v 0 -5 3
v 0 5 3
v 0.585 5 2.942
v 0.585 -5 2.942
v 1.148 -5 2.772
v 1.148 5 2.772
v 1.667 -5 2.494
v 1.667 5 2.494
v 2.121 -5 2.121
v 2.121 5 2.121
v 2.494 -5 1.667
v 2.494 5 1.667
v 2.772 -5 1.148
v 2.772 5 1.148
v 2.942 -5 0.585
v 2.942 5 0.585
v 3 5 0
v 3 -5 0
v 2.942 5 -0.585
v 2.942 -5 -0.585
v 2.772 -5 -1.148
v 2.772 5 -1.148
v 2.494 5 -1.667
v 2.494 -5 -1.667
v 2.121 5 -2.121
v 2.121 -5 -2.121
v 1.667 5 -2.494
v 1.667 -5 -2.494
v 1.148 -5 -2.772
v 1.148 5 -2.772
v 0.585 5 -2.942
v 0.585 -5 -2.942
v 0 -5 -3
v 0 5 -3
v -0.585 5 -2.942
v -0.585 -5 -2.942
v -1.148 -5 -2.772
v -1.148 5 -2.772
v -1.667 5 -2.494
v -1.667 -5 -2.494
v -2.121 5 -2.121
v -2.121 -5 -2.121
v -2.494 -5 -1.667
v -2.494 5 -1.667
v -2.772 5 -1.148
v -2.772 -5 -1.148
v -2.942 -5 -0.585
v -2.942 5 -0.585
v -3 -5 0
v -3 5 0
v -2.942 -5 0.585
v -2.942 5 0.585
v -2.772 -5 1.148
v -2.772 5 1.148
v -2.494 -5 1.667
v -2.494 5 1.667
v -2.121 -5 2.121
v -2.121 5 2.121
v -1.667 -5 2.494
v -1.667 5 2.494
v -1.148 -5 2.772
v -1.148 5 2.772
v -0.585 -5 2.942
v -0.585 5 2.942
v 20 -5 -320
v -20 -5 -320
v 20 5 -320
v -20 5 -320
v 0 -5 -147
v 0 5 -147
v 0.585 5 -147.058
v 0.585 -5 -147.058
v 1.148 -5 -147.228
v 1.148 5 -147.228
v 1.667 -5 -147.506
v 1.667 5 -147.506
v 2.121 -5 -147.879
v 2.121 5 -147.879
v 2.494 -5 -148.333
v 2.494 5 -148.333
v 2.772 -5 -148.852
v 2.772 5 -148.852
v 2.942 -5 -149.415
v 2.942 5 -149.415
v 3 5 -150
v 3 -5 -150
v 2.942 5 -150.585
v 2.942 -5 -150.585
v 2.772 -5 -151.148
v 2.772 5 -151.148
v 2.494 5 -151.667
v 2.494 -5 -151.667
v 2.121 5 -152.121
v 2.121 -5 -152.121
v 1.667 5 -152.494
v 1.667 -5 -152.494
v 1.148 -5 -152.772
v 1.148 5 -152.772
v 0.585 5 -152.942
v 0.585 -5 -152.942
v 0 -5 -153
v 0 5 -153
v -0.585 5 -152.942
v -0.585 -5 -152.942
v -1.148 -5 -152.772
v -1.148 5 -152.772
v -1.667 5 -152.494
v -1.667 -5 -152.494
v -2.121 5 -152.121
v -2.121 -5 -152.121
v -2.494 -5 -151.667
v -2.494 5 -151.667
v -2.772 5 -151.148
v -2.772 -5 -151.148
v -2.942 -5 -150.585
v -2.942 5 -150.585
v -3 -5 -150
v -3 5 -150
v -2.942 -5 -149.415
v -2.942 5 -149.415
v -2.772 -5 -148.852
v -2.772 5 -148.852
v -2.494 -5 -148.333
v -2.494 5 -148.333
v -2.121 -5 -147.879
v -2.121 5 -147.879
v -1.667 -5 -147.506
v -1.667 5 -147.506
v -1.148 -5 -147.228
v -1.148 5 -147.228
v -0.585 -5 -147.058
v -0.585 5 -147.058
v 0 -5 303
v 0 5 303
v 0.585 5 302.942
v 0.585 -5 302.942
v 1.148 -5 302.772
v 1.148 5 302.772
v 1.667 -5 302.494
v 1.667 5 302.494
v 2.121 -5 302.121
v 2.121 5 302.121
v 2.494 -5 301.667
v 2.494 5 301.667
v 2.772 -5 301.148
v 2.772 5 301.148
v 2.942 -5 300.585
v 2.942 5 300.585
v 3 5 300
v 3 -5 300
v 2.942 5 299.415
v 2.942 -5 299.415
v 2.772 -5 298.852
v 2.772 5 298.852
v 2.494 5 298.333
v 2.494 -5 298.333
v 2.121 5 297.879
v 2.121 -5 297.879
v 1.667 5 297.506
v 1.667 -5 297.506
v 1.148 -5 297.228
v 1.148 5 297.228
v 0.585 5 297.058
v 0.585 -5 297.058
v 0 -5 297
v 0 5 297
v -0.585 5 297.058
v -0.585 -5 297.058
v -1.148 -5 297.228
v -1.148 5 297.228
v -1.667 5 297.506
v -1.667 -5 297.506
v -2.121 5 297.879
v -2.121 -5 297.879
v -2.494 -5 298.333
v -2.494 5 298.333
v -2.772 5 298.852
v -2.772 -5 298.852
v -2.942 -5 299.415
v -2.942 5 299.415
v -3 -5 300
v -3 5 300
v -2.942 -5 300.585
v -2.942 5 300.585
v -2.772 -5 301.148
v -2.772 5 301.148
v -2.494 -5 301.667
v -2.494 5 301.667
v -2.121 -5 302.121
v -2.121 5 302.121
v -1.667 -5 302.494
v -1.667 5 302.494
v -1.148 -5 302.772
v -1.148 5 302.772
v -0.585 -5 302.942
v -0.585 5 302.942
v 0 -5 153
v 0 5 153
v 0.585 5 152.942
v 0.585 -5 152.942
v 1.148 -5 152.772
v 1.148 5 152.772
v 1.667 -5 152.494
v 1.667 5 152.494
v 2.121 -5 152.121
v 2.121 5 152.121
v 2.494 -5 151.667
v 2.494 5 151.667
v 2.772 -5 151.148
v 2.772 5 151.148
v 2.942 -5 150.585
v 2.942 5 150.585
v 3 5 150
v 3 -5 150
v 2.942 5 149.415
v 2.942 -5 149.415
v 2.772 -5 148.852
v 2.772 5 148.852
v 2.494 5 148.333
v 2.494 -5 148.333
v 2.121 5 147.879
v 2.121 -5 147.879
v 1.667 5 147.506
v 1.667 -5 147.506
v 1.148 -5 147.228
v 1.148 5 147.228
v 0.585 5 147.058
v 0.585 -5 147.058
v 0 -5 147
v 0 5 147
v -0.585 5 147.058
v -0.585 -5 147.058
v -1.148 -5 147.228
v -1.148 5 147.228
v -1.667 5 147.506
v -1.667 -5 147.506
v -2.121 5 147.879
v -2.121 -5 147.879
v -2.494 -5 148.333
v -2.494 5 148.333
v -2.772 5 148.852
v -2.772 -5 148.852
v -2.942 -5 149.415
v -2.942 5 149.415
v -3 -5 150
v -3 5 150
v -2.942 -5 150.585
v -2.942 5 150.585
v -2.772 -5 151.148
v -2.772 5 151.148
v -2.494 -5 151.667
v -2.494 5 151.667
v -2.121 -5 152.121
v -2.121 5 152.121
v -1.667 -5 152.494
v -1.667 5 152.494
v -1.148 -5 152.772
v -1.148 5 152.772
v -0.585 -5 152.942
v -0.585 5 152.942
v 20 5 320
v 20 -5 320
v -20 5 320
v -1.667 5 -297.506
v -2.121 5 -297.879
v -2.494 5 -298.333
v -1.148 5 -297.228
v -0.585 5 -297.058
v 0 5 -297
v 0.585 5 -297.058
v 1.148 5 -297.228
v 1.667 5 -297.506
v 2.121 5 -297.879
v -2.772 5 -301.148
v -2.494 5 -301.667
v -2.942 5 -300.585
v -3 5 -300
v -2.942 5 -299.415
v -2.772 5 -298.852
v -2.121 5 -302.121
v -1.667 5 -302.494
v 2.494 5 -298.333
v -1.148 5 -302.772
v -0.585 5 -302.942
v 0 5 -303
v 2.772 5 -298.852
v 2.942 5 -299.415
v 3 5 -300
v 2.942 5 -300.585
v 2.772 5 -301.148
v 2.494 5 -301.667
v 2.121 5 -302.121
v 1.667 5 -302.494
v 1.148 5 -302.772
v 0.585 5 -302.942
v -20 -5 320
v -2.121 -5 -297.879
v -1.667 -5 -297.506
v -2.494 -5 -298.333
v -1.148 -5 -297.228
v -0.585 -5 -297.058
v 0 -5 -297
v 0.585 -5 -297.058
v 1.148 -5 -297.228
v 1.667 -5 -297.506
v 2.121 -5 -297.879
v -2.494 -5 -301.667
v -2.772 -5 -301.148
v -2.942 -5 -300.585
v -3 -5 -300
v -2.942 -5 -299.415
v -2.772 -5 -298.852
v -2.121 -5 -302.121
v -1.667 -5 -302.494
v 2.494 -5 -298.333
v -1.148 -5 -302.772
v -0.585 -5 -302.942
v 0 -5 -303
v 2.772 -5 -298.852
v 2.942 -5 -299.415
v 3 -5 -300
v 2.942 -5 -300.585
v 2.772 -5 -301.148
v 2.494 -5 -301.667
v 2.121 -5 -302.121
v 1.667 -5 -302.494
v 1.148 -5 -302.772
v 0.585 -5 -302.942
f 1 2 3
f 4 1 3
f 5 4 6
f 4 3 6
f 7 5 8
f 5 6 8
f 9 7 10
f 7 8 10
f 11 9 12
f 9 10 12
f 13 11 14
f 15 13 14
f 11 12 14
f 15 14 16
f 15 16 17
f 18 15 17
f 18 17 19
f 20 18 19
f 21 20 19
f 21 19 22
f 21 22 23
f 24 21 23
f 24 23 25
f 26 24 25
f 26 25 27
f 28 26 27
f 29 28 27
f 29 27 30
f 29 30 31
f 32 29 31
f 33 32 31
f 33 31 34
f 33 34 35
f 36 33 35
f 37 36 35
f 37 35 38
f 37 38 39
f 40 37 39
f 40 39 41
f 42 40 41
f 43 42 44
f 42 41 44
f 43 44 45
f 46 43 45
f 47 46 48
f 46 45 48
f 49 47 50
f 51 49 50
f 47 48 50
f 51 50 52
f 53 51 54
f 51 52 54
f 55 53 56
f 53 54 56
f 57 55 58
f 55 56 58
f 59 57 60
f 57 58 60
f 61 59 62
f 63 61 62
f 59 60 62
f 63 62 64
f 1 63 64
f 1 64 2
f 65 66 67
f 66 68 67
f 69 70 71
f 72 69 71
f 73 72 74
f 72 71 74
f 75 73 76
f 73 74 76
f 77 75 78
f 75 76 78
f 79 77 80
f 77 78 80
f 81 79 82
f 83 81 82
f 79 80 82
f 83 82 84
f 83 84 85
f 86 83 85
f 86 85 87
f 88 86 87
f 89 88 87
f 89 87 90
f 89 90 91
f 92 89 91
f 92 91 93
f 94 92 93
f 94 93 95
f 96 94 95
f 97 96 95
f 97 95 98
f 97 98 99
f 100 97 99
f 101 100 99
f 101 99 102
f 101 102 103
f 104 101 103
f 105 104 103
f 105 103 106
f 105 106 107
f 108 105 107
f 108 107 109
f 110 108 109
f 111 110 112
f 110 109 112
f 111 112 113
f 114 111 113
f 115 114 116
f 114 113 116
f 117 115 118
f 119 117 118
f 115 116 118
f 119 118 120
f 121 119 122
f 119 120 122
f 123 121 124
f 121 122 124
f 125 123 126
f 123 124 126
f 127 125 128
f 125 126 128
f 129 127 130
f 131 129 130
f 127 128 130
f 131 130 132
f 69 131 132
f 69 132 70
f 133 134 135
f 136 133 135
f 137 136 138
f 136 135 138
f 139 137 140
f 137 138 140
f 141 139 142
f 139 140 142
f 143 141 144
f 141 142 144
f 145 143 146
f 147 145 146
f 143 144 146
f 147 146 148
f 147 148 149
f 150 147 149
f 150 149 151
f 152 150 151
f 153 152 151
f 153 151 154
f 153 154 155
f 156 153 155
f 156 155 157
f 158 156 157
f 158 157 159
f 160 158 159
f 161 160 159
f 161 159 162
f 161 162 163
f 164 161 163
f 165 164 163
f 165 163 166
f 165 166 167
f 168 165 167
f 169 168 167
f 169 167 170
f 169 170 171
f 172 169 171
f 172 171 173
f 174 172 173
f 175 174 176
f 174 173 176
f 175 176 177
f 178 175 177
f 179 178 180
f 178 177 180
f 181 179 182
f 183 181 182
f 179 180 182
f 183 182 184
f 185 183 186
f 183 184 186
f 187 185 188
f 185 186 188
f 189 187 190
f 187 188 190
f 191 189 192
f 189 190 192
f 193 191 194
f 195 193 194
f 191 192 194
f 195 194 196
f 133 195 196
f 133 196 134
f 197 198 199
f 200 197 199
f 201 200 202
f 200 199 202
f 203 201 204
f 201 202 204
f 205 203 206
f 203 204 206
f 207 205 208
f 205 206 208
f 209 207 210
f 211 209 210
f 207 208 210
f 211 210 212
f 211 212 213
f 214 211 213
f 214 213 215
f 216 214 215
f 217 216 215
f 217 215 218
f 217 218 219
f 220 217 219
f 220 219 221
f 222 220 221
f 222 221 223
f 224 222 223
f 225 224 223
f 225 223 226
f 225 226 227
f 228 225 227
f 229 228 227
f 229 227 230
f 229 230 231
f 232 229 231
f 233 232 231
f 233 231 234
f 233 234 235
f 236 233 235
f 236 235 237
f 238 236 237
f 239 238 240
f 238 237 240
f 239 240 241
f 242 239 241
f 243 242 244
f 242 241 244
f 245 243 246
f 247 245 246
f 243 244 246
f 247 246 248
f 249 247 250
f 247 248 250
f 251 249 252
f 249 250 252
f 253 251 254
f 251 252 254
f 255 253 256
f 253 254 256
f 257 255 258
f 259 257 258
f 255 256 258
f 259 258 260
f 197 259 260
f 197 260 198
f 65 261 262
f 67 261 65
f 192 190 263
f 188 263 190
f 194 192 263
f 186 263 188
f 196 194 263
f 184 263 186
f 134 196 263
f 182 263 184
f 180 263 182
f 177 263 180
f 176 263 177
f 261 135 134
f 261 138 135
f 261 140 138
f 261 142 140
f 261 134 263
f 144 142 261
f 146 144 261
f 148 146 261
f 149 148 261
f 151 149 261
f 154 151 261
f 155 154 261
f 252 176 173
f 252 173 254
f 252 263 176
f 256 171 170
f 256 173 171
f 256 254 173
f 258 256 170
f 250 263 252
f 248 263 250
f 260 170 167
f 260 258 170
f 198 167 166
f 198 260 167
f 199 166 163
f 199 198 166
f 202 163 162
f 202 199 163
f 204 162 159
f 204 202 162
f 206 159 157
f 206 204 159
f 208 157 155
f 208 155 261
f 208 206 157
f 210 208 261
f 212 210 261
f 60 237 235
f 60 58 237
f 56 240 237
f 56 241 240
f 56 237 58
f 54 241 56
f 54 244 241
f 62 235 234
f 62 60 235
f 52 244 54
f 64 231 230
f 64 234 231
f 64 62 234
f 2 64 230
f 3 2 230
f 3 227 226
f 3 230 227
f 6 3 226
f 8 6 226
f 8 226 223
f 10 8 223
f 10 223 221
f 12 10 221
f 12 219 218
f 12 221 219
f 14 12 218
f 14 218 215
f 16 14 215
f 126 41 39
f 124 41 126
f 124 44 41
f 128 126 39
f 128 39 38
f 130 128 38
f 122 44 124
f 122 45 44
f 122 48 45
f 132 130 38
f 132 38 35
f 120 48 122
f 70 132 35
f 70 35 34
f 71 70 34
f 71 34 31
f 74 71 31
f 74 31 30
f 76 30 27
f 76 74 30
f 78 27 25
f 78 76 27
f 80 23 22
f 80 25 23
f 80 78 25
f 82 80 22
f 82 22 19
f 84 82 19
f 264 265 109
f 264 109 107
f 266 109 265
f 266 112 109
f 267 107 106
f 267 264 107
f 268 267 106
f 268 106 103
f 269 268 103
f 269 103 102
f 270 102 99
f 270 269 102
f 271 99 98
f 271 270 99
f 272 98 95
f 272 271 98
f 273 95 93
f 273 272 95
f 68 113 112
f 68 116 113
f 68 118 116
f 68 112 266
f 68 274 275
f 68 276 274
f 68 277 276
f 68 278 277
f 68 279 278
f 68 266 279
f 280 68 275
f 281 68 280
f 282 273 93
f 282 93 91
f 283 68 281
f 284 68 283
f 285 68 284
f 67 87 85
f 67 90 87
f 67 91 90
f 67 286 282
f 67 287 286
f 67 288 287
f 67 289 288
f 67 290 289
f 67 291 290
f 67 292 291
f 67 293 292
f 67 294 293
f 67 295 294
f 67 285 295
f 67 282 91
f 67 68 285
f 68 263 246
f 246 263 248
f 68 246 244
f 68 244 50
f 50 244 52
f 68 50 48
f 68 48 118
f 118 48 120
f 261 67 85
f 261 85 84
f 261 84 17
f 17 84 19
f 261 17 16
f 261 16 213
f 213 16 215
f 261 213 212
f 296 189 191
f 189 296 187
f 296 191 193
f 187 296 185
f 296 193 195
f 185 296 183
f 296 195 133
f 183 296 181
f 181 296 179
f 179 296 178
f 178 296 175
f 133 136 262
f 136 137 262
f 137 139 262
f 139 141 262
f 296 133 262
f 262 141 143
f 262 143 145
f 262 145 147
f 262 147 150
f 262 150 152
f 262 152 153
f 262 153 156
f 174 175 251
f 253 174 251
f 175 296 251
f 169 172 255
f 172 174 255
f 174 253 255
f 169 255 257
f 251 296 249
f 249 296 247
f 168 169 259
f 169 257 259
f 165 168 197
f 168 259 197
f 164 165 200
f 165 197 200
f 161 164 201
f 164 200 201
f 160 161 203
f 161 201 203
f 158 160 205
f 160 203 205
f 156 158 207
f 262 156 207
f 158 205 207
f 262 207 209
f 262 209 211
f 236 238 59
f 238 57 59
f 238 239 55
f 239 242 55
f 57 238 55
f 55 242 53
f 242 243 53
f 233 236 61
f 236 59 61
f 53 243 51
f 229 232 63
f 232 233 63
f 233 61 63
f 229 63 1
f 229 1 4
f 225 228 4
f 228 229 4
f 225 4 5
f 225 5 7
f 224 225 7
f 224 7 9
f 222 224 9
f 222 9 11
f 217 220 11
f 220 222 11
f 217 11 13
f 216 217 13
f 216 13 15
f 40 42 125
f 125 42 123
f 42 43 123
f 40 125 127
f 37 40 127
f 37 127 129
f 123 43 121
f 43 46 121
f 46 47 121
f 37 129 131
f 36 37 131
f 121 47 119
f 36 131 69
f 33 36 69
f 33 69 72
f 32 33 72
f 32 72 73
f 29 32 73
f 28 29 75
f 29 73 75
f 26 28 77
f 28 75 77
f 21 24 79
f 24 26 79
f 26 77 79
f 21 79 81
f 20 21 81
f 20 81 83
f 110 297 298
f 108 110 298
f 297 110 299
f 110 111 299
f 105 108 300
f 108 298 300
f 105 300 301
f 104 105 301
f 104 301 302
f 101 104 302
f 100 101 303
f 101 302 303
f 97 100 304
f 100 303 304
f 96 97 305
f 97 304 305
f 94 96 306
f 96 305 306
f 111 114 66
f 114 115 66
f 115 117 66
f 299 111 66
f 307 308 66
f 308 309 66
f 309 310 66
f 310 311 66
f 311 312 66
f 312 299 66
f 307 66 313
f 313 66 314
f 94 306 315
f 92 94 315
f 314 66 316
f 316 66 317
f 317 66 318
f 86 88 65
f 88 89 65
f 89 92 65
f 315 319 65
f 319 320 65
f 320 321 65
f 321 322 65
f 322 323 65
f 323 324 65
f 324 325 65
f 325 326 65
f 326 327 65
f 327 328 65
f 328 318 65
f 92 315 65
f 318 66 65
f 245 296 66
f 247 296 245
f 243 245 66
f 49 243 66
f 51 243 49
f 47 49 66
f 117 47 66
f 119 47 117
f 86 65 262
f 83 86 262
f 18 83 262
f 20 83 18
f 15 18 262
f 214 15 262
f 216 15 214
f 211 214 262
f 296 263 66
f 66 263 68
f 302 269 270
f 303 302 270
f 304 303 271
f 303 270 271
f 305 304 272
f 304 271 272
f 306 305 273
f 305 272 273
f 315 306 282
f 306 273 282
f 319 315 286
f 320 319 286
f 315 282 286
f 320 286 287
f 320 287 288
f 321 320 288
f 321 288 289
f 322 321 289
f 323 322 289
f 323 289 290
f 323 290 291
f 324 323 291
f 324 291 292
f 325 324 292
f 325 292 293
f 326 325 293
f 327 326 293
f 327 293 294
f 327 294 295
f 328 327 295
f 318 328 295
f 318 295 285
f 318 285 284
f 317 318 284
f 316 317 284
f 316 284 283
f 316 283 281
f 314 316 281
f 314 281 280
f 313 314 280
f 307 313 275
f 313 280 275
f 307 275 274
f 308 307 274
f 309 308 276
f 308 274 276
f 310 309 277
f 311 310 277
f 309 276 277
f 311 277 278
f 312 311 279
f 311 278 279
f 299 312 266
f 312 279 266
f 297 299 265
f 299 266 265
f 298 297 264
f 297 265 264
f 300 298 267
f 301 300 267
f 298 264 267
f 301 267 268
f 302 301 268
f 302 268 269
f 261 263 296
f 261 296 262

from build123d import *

# Parameters (mm, degrees)
SKETCH_1_W             = 40
SKETCH_1_H             = 640
EXTRUDE_1_DEPTH        = 5
SKETCH_2_R             = 3
CUT_EXTRUDE_1_DEPTH    = 321.780298647
PATTERN_LINEAR_1_COUNT = 5
PATTERN_LINEAR_1_PITCH = 150


with BuildPart() as part:
    # Эскиз1 → Бобышка-Вытянуть1 (new, symmetric)
    with BuildSketch(Plane(origin=(0, 0, 0), x_dir=(1, 0, 0), z_dir=(0, 1, 0))):
        Rectangle(SKETCH_1_W, SKETCH_1_H)
    extrude(amount=EXTRUDE_1_DEPTH, both=True)

    # Эскиз2 → Вырез-Вытянуть1 (cut, through all)
    with BuildSketch(Plane(origin=(0, 5, 0), x_dir=(1, 0, 0), z_dir=(0, 1, 0))):
        with Locations(Location((0, -300, 0), (0, 0, 270))):
            Circle(SKETCH_2_R)
    cut_extrude_1 = extrude(amount=-CUT_EXTRUDE_1_DEPTH, mode=Mode.SUBTRACT)

    # Линейный массив1: Вырез-Вытянуть1 ×5
    with Locations(*[(0, 0, -i * PATTERN_LINEAR_1_PITCH) for i in range(1, PATTERN_LINEAR_1_COUNT)]):
        add(cut_extrude_1, mode=Mode.SUBTRACT)


solid = part.part
